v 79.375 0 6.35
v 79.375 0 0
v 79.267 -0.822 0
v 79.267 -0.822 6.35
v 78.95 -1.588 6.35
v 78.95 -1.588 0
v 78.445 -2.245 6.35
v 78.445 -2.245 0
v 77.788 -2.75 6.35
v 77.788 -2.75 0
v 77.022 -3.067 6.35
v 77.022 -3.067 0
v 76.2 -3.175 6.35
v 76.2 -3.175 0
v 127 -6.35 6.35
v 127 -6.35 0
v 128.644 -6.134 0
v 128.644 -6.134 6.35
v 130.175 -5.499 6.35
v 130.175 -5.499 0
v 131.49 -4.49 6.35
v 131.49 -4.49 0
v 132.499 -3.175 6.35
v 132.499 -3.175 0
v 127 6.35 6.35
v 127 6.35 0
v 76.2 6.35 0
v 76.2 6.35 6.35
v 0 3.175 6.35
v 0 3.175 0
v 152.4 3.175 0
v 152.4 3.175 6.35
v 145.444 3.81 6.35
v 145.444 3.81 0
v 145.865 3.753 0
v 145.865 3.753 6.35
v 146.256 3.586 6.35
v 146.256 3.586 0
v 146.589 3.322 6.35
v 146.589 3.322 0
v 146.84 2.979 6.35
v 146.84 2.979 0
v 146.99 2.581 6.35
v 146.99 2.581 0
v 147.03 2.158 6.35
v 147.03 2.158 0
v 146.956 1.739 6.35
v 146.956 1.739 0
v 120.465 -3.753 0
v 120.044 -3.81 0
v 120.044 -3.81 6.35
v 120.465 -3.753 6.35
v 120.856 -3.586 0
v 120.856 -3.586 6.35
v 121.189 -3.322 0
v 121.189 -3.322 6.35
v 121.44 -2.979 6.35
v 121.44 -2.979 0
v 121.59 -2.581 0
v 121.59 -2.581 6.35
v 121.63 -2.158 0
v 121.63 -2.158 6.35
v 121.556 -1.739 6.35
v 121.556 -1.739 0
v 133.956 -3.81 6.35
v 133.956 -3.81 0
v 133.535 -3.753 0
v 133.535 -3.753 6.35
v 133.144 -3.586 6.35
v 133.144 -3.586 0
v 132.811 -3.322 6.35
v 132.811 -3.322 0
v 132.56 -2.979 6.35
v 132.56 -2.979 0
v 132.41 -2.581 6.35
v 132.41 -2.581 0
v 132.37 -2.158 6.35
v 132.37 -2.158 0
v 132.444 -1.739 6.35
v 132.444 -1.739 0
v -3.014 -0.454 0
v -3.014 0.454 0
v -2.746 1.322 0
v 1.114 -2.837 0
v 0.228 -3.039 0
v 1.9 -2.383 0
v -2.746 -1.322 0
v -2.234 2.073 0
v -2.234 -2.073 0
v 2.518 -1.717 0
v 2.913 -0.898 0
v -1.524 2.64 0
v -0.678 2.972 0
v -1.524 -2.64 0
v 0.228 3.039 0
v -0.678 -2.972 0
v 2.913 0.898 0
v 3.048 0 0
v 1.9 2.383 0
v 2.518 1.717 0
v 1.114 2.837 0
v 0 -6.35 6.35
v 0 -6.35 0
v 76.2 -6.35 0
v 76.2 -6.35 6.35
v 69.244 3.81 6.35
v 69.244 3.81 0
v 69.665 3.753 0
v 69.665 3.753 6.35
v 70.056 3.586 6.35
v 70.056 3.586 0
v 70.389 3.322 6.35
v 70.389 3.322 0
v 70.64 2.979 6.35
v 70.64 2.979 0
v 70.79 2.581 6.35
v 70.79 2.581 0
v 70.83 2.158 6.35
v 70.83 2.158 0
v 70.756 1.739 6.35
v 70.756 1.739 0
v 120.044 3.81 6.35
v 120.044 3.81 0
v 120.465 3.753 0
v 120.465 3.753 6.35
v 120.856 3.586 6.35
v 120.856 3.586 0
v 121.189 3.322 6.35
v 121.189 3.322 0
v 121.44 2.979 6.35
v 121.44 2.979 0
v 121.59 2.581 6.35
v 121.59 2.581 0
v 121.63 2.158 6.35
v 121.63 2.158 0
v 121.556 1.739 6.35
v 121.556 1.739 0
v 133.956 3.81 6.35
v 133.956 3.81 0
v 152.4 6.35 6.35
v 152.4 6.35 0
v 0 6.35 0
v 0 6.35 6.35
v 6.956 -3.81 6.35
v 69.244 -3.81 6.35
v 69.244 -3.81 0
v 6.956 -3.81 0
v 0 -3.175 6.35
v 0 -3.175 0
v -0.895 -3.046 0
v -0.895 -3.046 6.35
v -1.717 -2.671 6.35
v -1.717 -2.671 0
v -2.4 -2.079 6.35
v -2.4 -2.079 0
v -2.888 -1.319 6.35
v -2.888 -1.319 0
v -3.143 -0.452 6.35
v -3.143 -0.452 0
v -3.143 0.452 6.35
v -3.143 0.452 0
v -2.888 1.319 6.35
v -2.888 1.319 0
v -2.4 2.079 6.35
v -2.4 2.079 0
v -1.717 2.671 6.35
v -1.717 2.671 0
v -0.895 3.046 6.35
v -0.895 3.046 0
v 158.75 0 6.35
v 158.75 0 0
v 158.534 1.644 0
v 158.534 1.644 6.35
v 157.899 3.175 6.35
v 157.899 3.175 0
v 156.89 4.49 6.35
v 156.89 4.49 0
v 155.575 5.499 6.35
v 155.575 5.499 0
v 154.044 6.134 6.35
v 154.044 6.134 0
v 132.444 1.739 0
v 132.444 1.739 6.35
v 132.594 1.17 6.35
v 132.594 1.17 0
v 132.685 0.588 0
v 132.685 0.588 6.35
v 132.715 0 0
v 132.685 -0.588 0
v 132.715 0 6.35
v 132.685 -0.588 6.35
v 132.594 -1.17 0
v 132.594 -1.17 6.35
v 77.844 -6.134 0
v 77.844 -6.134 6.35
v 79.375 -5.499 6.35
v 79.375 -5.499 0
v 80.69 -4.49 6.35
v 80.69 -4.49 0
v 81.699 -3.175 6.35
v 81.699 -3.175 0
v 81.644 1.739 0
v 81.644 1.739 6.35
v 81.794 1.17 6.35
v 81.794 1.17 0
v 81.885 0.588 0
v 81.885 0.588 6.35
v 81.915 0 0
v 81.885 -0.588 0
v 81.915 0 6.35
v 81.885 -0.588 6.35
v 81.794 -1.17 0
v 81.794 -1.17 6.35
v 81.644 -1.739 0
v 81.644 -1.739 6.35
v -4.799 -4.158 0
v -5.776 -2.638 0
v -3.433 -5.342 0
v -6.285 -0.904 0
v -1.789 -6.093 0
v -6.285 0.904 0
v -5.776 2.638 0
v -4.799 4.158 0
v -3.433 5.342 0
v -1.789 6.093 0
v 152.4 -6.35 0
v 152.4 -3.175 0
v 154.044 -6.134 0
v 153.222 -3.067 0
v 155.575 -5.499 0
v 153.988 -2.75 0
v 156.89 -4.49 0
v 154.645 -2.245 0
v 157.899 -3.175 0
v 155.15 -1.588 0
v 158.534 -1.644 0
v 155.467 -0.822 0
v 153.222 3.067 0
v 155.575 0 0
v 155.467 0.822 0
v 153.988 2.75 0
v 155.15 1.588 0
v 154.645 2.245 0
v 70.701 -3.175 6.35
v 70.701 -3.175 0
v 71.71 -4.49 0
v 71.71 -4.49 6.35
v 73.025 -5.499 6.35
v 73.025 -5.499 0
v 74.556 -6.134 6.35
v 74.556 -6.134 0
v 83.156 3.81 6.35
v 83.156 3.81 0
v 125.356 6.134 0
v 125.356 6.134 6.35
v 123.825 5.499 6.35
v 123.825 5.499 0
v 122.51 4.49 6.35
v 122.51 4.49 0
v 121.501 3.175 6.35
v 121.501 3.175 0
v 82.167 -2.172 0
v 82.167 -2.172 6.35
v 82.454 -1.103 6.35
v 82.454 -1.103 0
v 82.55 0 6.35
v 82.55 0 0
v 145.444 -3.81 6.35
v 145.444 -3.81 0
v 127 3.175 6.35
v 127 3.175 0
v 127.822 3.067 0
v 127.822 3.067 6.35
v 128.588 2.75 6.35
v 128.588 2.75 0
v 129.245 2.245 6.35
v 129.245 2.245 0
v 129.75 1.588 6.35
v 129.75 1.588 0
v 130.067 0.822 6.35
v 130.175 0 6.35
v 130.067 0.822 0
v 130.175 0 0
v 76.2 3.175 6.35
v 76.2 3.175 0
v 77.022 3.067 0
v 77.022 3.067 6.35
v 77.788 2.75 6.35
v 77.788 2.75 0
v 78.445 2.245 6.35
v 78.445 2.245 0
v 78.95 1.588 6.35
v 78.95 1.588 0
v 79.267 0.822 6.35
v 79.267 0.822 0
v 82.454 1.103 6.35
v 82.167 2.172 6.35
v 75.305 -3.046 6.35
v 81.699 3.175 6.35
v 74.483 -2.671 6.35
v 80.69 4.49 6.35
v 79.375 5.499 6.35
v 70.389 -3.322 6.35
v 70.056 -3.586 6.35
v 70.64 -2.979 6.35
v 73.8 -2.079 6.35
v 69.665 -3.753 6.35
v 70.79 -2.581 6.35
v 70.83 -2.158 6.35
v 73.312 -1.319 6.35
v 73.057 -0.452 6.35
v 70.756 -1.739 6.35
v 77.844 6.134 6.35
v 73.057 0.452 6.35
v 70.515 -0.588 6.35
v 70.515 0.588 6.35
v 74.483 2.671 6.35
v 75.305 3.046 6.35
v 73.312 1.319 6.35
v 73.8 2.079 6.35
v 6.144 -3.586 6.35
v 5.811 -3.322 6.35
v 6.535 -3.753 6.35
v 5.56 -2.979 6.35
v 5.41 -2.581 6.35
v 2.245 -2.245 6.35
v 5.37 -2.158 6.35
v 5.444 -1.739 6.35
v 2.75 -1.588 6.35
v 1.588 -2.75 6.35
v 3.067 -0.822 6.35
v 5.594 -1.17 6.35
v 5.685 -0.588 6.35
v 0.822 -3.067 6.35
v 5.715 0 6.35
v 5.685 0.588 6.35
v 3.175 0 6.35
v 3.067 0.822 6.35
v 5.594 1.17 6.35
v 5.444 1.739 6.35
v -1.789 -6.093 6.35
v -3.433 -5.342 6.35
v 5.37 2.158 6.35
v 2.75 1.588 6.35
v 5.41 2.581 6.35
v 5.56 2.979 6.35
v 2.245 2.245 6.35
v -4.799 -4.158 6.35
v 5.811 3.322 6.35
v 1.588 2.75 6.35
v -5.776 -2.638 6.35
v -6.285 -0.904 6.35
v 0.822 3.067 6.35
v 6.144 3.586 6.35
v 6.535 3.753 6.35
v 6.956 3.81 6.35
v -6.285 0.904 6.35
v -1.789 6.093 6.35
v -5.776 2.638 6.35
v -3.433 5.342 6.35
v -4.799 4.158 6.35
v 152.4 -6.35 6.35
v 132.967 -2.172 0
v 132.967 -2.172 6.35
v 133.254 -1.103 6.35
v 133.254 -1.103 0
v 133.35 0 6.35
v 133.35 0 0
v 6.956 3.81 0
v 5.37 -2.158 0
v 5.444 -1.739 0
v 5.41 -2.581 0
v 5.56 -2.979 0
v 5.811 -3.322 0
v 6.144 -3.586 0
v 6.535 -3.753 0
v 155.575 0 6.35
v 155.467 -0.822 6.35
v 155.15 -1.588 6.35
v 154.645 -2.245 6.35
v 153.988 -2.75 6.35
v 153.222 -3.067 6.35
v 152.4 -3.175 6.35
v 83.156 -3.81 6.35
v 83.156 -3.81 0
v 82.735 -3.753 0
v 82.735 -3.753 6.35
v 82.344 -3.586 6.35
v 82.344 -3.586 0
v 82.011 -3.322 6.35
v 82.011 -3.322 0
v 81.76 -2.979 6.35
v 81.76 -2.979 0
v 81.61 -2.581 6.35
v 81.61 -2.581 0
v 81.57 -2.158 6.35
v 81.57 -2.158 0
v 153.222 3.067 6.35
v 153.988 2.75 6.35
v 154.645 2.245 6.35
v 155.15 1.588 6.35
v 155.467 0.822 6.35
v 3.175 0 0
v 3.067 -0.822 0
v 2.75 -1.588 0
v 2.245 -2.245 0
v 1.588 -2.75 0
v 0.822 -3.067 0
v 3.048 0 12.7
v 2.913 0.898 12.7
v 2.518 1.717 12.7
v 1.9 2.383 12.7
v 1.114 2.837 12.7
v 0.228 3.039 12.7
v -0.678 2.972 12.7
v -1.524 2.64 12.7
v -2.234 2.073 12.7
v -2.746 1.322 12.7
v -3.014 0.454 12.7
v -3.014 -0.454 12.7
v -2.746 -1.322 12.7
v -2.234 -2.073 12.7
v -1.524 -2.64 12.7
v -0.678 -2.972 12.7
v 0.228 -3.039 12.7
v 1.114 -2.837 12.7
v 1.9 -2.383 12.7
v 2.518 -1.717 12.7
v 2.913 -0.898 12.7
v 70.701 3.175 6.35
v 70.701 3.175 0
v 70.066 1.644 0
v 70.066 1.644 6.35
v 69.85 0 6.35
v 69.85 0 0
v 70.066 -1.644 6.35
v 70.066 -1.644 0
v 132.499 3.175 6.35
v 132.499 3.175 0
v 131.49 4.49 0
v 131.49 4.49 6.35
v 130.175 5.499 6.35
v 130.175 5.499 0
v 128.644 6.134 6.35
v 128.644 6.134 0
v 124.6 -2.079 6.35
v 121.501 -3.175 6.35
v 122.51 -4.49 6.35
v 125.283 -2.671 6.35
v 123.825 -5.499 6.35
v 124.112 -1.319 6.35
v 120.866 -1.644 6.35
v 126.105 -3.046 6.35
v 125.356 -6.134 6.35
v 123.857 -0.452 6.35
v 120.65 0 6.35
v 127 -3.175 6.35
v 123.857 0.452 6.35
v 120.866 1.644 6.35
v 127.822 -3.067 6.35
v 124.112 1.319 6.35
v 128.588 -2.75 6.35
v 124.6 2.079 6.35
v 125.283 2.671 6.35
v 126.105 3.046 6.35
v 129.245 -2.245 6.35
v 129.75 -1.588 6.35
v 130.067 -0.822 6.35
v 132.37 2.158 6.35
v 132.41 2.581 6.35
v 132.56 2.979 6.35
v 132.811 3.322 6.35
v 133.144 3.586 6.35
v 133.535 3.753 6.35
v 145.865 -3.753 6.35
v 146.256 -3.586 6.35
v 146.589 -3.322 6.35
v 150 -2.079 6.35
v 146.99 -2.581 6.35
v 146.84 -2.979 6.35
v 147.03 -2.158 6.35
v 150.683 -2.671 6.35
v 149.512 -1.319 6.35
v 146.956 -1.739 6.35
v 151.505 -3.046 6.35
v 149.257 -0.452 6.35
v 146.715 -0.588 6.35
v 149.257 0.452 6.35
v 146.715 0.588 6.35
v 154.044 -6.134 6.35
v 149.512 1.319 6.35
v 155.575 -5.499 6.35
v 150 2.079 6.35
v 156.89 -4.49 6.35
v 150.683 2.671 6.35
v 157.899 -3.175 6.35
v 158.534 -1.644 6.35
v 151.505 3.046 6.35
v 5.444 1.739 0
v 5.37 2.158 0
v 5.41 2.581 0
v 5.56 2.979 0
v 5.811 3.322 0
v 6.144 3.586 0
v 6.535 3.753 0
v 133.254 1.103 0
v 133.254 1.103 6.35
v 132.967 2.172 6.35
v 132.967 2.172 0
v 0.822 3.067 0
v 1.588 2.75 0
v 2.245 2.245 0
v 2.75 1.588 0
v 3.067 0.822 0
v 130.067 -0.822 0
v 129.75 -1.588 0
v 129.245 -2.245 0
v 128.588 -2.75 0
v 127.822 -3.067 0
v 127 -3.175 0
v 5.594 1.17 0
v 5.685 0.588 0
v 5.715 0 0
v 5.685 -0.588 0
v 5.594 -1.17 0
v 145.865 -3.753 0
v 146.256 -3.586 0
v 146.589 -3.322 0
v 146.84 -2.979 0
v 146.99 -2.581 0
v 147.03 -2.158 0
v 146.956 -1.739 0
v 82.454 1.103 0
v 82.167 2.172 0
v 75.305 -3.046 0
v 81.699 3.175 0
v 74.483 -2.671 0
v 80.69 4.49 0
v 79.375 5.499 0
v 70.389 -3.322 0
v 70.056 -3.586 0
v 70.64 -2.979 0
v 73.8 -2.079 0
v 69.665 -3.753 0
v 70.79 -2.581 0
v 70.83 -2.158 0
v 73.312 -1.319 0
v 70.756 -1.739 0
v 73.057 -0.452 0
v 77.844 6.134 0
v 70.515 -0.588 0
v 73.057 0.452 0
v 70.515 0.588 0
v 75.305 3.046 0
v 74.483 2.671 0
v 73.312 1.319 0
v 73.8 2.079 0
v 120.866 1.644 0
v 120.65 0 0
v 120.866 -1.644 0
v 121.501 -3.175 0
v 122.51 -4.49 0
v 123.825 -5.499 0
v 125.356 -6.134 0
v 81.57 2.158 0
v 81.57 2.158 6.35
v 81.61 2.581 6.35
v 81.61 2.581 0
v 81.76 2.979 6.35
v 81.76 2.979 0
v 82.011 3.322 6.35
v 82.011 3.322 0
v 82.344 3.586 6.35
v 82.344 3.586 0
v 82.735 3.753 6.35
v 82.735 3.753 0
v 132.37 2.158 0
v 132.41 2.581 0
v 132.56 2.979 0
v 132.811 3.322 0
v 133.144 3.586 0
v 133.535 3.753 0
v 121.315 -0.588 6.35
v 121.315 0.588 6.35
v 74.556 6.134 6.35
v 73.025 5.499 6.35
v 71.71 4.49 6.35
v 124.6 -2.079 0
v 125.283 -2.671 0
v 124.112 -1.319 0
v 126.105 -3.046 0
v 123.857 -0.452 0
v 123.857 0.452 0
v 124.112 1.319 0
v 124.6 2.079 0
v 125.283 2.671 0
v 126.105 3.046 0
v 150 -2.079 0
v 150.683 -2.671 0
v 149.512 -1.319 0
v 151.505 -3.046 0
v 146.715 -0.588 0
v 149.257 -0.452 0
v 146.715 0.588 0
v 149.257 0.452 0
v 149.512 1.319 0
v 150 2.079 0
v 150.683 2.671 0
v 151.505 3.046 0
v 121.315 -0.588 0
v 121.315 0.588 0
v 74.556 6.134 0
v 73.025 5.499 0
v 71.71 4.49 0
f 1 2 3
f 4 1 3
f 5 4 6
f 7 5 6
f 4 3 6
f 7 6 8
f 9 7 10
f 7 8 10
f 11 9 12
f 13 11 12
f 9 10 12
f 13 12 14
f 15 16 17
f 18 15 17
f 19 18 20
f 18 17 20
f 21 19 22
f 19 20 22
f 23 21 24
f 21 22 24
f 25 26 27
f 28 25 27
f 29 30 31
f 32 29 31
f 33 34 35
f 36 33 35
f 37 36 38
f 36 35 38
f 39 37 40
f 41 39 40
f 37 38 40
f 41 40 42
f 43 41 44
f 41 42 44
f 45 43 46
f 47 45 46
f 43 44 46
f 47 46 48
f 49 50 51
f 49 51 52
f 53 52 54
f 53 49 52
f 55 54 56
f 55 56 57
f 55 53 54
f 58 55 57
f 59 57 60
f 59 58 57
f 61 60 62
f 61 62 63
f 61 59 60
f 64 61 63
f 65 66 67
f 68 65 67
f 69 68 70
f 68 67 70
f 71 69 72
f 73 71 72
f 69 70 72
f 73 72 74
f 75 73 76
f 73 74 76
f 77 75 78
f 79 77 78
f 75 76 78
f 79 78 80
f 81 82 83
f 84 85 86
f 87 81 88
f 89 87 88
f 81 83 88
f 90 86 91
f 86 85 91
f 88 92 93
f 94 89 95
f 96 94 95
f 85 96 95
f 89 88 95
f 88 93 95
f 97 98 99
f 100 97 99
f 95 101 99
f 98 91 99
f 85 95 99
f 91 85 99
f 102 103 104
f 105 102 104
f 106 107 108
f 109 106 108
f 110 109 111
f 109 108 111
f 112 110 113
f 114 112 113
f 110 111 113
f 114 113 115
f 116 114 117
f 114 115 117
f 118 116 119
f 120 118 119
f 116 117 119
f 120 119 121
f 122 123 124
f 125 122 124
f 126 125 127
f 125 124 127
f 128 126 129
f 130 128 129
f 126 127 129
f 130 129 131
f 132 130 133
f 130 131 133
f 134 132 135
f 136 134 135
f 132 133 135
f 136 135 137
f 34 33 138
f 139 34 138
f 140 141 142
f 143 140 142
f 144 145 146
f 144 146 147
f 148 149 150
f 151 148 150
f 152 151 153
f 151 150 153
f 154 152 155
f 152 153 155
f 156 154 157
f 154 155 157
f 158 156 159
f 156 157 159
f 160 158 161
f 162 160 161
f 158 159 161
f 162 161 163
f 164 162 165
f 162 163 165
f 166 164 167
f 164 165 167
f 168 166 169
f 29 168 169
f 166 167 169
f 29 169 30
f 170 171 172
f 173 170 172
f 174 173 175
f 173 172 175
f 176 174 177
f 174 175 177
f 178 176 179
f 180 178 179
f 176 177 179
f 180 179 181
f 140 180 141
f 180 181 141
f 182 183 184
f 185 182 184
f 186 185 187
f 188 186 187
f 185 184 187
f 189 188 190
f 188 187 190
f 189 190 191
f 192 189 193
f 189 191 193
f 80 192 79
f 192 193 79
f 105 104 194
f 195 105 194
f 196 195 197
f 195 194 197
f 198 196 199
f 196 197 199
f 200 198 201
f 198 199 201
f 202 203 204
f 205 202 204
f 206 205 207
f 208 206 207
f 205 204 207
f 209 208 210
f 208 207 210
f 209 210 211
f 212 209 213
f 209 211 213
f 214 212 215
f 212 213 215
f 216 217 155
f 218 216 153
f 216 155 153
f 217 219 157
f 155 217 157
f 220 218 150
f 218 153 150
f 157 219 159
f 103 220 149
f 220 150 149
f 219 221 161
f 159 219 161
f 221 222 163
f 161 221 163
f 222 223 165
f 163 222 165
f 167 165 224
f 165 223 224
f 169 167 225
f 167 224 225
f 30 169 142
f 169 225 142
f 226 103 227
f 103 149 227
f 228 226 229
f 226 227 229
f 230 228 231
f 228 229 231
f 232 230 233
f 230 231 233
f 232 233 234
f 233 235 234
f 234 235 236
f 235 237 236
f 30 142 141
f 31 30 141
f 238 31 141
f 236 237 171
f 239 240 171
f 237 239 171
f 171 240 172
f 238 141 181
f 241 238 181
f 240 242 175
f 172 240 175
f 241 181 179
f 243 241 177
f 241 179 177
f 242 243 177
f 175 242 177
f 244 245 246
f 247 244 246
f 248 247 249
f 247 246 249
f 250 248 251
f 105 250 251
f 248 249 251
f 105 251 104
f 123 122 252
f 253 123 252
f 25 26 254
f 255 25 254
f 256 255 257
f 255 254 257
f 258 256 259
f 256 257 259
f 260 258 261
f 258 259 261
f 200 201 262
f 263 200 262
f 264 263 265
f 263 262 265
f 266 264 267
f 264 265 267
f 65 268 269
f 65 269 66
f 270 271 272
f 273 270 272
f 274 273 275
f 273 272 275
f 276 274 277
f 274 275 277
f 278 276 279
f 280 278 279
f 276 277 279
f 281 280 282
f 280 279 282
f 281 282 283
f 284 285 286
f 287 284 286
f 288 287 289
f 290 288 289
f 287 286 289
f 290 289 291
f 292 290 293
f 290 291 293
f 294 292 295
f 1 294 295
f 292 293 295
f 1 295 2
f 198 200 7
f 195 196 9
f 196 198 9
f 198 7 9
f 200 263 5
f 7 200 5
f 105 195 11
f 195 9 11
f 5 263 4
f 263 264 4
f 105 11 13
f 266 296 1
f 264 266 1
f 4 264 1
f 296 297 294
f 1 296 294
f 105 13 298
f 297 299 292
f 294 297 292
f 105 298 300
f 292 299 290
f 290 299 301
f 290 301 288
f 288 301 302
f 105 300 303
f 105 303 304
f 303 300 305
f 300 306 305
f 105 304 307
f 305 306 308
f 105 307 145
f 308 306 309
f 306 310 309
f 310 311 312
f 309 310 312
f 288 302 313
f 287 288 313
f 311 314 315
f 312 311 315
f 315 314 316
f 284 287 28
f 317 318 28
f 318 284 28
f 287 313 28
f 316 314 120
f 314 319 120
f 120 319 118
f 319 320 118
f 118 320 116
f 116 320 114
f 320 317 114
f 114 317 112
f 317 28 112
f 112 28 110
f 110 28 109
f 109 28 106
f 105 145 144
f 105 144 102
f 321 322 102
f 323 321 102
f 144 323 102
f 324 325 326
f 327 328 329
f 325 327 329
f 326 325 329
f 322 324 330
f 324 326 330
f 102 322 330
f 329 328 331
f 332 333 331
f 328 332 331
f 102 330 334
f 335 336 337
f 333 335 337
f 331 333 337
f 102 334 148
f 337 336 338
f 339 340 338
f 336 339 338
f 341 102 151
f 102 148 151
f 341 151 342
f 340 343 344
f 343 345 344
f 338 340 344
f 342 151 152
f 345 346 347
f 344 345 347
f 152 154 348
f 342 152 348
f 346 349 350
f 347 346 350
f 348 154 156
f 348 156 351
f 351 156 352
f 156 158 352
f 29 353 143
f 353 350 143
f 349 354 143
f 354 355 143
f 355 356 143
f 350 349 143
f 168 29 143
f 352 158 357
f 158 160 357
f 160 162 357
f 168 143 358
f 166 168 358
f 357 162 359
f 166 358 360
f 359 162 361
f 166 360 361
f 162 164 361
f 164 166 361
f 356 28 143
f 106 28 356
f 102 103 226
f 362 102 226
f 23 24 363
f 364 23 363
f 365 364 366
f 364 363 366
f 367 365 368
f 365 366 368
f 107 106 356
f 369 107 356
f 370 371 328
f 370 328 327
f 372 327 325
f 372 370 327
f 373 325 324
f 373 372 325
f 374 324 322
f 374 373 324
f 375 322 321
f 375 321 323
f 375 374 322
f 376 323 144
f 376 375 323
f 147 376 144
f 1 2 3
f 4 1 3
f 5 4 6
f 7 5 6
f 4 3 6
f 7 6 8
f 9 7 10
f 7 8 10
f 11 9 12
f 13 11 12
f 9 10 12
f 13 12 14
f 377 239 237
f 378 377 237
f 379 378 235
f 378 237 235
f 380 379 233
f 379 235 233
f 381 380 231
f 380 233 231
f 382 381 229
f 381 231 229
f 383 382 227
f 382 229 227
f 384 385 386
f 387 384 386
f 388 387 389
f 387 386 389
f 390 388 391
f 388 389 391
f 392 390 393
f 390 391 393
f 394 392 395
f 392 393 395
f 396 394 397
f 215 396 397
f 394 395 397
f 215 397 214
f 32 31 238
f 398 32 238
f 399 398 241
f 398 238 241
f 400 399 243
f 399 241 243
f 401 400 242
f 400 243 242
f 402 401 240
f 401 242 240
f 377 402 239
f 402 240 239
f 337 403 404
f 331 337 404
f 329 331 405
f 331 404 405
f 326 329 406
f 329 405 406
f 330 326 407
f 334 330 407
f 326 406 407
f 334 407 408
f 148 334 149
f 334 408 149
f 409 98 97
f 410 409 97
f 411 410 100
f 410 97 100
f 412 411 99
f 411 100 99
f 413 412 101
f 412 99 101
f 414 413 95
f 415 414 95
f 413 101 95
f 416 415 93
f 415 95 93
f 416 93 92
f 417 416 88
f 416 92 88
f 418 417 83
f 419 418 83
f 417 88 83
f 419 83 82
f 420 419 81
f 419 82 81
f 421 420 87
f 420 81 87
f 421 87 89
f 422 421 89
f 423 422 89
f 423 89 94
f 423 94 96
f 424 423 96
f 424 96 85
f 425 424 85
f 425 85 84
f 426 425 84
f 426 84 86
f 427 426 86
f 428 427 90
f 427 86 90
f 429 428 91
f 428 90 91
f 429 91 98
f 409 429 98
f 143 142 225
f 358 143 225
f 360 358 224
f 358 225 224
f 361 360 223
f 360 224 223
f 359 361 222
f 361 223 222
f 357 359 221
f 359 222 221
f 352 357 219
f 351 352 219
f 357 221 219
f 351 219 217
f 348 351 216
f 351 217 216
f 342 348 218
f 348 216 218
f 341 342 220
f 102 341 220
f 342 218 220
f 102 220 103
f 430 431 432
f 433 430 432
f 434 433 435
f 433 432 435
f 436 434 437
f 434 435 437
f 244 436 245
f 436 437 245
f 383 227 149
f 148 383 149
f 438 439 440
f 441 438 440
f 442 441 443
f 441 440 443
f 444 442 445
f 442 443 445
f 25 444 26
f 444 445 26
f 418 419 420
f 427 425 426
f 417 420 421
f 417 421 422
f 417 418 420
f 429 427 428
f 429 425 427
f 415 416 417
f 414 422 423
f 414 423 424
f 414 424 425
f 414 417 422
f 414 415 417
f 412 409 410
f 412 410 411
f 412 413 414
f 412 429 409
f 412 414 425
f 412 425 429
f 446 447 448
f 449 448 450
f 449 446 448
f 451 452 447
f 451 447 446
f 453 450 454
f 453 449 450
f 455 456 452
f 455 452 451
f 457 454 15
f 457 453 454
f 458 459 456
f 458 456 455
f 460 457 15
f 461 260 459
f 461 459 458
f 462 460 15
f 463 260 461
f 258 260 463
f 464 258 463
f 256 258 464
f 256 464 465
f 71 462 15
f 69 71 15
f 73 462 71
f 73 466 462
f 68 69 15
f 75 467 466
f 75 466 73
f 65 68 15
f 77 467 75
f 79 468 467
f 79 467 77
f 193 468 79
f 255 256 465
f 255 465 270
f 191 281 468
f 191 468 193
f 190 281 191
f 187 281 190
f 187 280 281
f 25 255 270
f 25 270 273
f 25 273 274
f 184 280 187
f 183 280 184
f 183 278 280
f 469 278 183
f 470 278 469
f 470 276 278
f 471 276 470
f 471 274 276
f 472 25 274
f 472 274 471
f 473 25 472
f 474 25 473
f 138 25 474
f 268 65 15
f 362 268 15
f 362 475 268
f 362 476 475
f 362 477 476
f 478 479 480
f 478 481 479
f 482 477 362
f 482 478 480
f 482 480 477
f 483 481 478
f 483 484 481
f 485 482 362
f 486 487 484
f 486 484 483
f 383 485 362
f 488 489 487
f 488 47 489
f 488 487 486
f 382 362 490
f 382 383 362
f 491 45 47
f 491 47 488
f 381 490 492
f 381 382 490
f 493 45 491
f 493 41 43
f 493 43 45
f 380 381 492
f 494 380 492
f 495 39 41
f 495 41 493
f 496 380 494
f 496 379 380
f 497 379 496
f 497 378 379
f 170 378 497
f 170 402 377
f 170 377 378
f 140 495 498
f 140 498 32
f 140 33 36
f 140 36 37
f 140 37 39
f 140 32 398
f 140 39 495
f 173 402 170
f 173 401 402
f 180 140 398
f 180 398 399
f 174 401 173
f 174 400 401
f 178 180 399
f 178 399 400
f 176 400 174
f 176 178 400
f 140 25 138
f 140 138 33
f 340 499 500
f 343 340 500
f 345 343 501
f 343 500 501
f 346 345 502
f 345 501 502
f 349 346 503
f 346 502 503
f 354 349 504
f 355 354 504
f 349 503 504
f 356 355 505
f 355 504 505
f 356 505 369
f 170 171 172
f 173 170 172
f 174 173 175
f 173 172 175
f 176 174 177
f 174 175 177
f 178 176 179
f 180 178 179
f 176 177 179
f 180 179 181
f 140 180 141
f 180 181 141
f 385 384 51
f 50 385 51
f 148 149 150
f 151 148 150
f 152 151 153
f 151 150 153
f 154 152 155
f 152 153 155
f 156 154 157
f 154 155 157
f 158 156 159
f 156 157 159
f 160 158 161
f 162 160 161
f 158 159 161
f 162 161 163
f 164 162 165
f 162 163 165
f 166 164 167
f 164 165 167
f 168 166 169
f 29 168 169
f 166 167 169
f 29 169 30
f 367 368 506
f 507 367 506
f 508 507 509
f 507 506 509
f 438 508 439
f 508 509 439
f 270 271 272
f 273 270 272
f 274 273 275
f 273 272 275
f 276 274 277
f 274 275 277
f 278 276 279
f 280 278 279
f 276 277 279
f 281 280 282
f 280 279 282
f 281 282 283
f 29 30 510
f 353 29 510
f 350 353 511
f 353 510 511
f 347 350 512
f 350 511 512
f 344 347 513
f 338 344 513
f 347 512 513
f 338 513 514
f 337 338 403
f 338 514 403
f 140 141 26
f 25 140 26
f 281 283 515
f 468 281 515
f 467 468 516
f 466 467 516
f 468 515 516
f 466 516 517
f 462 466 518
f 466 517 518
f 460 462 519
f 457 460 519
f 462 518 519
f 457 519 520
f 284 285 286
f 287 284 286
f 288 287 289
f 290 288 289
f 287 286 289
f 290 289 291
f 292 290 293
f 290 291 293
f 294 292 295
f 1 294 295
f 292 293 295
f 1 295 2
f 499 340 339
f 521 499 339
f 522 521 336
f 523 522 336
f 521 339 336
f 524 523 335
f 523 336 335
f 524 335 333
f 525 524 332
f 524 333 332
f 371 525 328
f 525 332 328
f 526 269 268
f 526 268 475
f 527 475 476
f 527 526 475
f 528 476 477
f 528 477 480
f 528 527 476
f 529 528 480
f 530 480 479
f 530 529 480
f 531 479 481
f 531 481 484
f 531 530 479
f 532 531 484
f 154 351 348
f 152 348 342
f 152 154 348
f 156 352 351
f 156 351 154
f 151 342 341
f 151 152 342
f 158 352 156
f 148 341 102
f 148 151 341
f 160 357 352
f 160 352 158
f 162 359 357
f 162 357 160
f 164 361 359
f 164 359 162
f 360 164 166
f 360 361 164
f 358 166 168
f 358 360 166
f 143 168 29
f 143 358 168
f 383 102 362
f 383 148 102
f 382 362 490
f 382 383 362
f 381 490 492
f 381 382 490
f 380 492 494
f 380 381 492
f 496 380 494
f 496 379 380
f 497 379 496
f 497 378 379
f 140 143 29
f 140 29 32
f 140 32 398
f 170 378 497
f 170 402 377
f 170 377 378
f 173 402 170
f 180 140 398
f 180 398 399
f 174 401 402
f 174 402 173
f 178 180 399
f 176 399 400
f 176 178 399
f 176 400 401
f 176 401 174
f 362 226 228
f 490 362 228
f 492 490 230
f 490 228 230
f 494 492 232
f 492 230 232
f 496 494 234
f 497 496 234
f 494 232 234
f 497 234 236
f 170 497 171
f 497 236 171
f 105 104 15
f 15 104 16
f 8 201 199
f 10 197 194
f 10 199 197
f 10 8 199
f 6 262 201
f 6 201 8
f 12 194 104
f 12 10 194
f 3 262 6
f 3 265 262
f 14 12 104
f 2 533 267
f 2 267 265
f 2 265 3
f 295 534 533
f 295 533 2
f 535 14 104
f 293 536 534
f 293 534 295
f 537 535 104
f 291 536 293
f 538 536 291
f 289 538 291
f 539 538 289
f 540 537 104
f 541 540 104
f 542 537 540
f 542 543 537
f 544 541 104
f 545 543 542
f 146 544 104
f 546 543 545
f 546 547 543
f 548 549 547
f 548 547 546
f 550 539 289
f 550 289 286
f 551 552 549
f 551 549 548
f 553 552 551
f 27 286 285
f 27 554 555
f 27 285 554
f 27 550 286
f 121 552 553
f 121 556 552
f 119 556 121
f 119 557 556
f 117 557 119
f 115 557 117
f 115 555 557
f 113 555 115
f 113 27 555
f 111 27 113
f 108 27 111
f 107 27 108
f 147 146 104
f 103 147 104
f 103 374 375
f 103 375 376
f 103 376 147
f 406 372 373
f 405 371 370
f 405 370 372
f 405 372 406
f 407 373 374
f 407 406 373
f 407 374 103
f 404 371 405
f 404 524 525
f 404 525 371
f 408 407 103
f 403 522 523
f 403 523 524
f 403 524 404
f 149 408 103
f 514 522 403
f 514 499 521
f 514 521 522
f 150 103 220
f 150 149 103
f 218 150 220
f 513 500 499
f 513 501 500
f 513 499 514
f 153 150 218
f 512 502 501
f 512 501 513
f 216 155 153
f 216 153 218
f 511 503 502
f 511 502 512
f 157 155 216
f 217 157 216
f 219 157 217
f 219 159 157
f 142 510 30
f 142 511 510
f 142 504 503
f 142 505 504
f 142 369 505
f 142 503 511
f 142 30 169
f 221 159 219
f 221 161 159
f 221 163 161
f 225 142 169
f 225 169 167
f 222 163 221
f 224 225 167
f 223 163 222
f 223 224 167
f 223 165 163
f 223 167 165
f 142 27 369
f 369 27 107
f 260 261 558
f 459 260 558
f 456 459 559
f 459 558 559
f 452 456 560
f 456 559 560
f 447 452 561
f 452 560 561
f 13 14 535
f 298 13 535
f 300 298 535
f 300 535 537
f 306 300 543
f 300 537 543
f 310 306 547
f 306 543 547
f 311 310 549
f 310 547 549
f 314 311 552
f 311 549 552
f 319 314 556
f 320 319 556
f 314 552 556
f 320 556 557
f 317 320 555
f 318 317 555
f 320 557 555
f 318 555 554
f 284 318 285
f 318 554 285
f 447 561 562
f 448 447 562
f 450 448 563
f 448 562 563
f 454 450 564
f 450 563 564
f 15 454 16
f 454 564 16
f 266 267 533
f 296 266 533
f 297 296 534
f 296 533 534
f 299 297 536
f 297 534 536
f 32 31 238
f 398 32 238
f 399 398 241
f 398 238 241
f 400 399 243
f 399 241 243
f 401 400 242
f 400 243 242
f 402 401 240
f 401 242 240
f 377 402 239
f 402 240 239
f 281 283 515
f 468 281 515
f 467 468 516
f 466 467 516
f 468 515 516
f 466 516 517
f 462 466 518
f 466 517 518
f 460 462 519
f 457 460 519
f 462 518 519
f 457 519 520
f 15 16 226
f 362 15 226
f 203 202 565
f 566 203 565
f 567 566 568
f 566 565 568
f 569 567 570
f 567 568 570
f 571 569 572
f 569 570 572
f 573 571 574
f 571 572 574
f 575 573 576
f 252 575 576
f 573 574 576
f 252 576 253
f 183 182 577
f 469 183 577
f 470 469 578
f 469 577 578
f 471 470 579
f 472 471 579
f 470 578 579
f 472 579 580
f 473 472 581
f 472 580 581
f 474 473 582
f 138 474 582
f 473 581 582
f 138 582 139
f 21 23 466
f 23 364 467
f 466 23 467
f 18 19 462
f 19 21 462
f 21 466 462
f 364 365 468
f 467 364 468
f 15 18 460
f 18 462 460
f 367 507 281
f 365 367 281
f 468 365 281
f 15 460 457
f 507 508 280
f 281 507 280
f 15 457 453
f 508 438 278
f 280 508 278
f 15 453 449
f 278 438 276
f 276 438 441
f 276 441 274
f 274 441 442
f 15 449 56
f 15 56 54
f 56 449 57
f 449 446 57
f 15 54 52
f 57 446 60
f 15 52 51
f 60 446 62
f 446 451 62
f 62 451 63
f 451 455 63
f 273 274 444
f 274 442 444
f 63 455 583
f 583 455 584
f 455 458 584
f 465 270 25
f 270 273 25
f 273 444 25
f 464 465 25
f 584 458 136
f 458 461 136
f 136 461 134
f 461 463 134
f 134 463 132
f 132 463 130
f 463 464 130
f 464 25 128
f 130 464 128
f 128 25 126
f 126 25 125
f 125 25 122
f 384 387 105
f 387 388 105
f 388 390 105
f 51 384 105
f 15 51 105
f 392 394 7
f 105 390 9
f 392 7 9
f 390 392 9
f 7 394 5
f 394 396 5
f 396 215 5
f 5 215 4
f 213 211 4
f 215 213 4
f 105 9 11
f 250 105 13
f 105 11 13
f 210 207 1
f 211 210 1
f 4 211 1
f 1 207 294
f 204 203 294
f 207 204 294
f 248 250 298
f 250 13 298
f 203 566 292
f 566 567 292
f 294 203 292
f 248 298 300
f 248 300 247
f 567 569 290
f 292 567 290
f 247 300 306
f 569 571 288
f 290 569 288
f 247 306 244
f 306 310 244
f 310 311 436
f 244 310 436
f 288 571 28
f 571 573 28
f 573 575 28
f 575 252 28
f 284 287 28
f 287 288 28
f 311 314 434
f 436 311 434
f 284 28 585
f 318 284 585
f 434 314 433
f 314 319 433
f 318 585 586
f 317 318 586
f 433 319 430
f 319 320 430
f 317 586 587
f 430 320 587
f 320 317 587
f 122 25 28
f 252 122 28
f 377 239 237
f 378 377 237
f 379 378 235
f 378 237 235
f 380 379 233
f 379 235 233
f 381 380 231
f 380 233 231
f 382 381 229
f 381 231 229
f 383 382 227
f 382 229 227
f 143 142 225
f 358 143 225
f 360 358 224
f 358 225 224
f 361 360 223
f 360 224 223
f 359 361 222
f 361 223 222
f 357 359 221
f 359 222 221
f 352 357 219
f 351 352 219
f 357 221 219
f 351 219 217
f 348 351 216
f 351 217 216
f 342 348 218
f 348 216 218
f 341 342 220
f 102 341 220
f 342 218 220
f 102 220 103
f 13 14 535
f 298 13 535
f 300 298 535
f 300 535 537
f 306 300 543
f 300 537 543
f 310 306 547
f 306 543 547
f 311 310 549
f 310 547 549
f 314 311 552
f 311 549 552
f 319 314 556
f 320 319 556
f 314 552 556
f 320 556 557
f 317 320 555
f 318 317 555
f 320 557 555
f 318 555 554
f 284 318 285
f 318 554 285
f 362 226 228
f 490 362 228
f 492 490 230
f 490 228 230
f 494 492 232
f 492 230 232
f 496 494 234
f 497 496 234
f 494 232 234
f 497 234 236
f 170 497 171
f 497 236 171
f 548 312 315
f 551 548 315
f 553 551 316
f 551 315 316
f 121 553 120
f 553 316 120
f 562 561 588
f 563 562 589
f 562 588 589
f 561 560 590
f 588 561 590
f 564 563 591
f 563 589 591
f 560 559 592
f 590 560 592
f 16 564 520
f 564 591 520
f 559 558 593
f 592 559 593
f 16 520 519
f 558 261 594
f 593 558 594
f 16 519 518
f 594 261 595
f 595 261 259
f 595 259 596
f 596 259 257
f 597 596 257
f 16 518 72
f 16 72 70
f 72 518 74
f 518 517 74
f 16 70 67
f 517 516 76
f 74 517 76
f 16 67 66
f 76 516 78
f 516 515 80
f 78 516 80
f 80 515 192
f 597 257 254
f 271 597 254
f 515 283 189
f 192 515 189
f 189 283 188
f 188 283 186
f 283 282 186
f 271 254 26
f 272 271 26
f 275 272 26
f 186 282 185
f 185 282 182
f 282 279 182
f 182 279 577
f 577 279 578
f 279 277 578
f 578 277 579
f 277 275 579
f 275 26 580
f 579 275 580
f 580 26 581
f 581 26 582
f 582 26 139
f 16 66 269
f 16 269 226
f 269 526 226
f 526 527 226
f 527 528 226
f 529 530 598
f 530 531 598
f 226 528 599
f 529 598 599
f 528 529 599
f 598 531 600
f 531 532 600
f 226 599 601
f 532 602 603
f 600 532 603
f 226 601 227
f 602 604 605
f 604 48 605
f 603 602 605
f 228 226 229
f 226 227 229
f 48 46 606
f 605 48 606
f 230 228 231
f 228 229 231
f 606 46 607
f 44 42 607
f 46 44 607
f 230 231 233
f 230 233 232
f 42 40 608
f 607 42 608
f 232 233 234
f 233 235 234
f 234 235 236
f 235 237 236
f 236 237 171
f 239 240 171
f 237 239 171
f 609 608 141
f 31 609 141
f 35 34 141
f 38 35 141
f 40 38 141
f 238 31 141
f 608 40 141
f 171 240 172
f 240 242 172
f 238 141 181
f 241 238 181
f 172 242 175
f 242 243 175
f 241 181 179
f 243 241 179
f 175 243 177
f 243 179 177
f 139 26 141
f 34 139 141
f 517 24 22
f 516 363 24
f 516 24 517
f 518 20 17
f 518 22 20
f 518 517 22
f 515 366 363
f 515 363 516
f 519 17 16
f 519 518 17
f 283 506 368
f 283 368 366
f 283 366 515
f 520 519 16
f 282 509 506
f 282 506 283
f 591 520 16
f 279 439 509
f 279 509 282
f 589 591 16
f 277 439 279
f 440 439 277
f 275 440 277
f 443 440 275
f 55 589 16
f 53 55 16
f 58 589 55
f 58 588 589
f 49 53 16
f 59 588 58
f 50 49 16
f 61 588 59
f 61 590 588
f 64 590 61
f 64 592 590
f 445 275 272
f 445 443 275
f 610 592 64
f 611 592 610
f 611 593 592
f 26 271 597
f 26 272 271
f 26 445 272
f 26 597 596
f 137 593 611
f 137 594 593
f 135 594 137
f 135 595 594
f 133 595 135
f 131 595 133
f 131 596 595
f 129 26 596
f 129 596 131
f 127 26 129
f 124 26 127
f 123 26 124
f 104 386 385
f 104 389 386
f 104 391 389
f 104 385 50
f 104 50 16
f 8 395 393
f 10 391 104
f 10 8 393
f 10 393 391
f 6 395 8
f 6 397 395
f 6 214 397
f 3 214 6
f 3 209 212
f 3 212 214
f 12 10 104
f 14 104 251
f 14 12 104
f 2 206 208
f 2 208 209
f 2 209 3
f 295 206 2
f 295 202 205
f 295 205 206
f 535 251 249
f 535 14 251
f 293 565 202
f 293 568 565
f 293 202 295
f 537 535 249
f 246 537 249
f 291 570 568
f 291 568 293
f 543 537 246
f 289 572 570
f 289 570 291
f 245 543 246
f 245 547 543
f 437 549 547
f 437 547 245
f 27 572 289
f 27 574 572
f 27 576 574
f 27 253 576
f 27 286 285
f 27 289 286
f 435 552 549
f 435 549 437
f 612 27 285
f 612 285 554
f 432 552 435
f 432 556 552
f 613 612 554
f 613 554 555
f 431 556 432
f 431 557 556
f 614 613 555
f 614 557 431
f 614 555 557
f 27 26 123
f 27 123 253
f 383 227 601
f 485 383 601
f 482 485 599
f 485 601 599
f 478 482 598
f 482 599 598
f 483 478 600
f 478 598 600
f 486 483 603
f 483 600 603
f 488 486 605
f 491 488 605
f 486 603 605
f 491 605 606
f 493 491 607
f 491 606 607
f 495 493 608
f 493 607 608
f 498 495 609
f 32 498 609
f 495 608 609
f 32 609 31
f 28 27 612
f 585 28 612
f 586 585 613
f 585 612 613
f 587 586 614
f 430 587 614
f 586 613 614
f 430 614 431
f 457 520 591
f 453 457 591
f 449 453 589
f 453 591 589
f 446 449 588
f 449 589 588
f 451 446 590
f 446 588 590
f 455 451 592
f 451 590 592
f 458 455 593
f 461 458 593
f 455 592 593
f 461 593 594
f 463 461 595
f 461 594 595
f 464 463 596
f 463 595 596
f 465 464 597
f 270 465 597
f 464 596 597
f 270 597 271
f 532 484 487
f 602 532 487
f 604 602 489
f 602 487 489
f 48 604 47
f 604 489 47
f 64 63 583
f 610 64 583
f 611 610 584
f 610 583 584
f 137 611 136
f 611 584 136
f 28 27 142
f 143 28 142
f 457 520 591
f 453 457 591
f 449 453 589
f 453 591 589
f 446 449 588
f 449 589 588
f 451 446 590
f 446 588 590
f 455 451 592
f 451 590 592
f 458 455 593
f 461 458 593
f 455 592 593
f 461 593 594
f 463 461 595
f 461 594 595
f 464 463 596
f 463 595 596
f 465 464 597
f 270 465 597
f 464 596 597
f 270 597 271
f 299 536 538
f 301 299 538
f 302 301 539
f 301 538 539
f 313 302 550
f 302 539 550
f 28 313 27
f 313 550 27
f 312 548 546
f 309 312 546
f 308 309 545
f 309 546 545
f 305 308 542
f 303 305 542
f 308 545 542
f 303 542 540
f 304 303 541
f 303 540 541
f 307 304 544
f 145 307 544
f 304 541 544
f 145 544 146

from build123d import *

# Parameters (mm, degrees)
F1_DEPTH      = 6.35
F2_DEPTH      = 6.35
F3_DEPTH      = 6.35
F4_DEPTH      = 6.35
F0_R          = 3.048
F5_DEPTH      = 12.7
F6_T          = -2.54
F7_T          = -2.54
F8_T          = -2.54
F9_T1_DEPTH   = 6.35
F9_2_T1_DEPTH = 6.35
F9_3_T1_DEPTH = 6.35


# Not quite as in the source:
# - a fillet or chamfer that OpenCascade refuses, or shapes differently, is made with other operations: its cross-section is extruded or revolved along the edge and cut away or added
# - two fillets or chamfers of one size are made in one step


with BuildPart() as f1:
    # F0 (on Top) → F1 (new body)
    with BuildSketch(Plane.XY):
        with BuildLine():
            ThreePointArc((0, 6.35), (3.175, 5.499261314), (5.499261314, 3.175))
            Line((5.499261314, 3.175), (70.700738686, 3.175))
            ThreePointArc((70.700738686, 3.175), (73.025, 5.499261314), (76.2, 6.35))
            Line((76.2, 6.35), (0, 6.35))
        make_face()
        with BuildLine():
            Line((76.2, 3.175), (70.700738686, 3.175))
            ThreePointArc((70.700738686, 3.175), (69.85, 0), (70.700738686, -3.175))
            Line((70.700738686, -3.175), (76.2, -3.175))
            ThreePointArc((76.2, -3.175), (73.025, 0), (76.2, 3.175))
        make_face()
        with BuildLine():
            Line((81.699261314, 3.175), (76.2, 3.175))
            ThreePointArc((76.2, 3.175), (78.4450640303, 2.2450640303), (79.375, 0))
            ThreePointArc((79.375, 0), (78.4450640303, -2.2450640303), (76.2, -3.175))
            Line((76.2, -3.175), (81.699261314, -3.175))
            ThreePointArc((81.699261314, -3.175), (82.3336289969, -1.6435009364), (82.55, 0))
            ThreePointArc((82.55, 0), (82.3336289969, 1.6435009364), (81.699261314, 3.175))
        make_face()
        with BuildLine():
            ThreePointArc((0, -3.175), (-3.175, 0), (0, 3.175))
            Line((0, 3.175), (5.499261314, 3.175))
            ThreePointArc((5.499261314, 3.175), (3.175, 5.499261314), (0, 6.35))
            ThreePointArc((0, 6.35), (-6.35, 0), (0, -6.35))
            ThreePointArc((0, -6.35), (3.175, -5.499261314), (5.499261314, -3.175))
            Line((5.499261314, -3.175), (0, -3.175))
        make_face()
        with BuildLine():
            ThreePointArc((0, 3.175), (2.2450640303, 2.2450640303), (3.175, 0))
            ThreePointArc((3.175, 0), (2.2450640303, -2.2450640303), (0, -3.175))
            Line((0, -3.175), (5.499261314, -3.175))
            ThreePointArc((5.499261314, -3.175), (6.1336289969, -1.6435009364), (6.35, 0))
            ThreePointArc((6.35, 0), (6.1336289969, 1.6435009364), (5.499261314, 3.175))
            Line((5.499261314, 3.175), (0, 3.175))
        make_face()
        with BuildLine():
            Line((70.700738686, 3.175), (5.499261314, 3.175))
            ThreePointArc((5.499261314, 3.175), (6.1336289969, 1.6435009364), (6.35, 0))
            ThreePointArc((6.35, 0), (6.1336289969, -1.6435009364), (5.499261314, -3.175))
            Line((5.499261314, -3.175), (70.700738686, -3.175))
            ThreePointArc((70.700738686, -3.175), (69.85, 0), (70.700738686, 3.175))
        make_face()
        with BuildLine():
            Line((70.700738686, -3.175), (5.499261314, -3.175))
            ThreePointArc((5.499261314, -3.175), (3.175, -5.499261314), (0, -6.35))
            Line((0, -6.35), (76.2, -6.35))
            ThreePointArc((76.2, -6.35), (73.025, -5.499261314), (70.700738686, -3.175))
        make_face()
        with BuildLine():
            ThreePointArc((76.2, 6.35), (73.025, 5.499261314), (70.700738686, 3.175))
            Line((70.700738686, 3.175), (76.2, 3.175))
            Line((76.2, 3.175), (81.699261314, 3.175))
            ThreePointArc((81.699261314, 3.175), (79.375, 5.499261314), (76.2, 6.35))
        make_face()
        with BuildLine():
            Line((76.2, -3.175), (70.700738686, -3.175))
            ThreePointArc((70.700738686, -3.175), (73.025, -5.499261314), (76.2, -6.35))
            ThreePointArc((76.2, -6.35), (79.375, -5.499261314), (81.699261314, -3.175))
            Line((81.699261314, -3.175), (76.2, -3.175))
        make_face()
    extrude(amount=F1_DEPTH)

    # F6: a shell. OpenCascade refuses it in one call, so the cavity is built on its own and cut out:
    # the body offset inwards by the wall thickness, plus a prism from it out through each open face.
    f6_core = offset(f1.part, amount=F6_T, mode=Mode.PRIVATE)
    f6_exits = [f6_core.faces().sort_by_distance(p)[0] for p in [
        (38.1, 0, 3.81),
        (38.1, 0, 2.54),
    ]]
    add(f6_core, mode=Mode.SUBTRACT)
    extrude(f6_exits, amount=-F6_T, mode=Mode.SUBTRACT)

    # F9: fillet of radius 1.5875 on 4 edges, made by hand

    # F9_s2 → F9_t1 (join)
    with BuildSketch(Plane.XY):
        with BuildLine():
            ThreePointArc((5.4438859411, -1.7393478261), (5.674054576, -3.1587564216), (6.9560764803, -3.81))
            Line((6.9560764803, -3.81), (4.2597094971, -3.81))
            ThreePointArc((4.2597094971, -3.81), (4.961032273, -2.8371435964), (5.4438859411, -1.7393478261))
        make_face()
        with BuildLine():
            ThreePointArc((5.4438859411, 1.7393478261), (5.674054576, 3.1587564216), (6.9560764803, 3.81))
            Line((6.9560764803, 3.81), (4.2597094971, 3.81))
            ThreePointArc((4.2597094971, 3.81), (4.961032273, 2.8371435964), (5.4438859411, 1.7393478261))
        make_face()
        with BuildLine():
            ThreePointArc((69.2439235197, 3.81), (70.525945424, 3.1587564216), (70.7561140589, 1.7393478261))
            ThreePointArc((70.7561140589, 1.7393478261), (71.238967727, 2.8371435964), (71.9402905029, 3.81))
            Line((71.9402905029, 3.81), (69.2439235197, 3.81))
        make_face()
        with BuildLine():
            ThreePointArc((70.7561140589, -1.7393478261), (70.525945424, -3.1587564216), (69.2439235197, -3.81))
            Line((69.2439235197, -3.81), (71.9402905029, -3.81))
            ThreePointArc((71.9402905029, -3.81), (71.238967727, -2.8371435964), (70.7561140589, -1.7393478261))
        make_face()
    extrude(amount=F9_T1_DEPTH)


with BuildPart() as f2:
    # F0 (on Top) → F2 (new body)
    with BuildSketch(Plane.XY):
        with BuildLine():
            Line((127, 6.35), (76.2, 6.35))
            ThreePointArc((76.2, 6.35), (79.375, 5.499261314), (81.699261314, 3.175))
            Line((81.699261314, 3.175), (121.500738686, 3.175))
            ThreePointArc((121.500738686, 3.175), (123.825, 5.499261314), (127, 6.35))
        make_face()
        with BuildLine():
            Line((121.500738686, 3.175), (81.699261314, 3.175))
            ThreePointArc((81.699261314, 3.175), (82.3336289969, 1.6435009364), (82.55, 0))
            ThreePointArc((82.55, 0), (82.3336289969, -1.6435009364), (81.699261314, -3.175))
            Line((81.699261314, -3.175), (121.500738686, -3.175))
            ThreePointArc((121.500738686, -3.175), (120.65, 0), (121.500738686, 3.175))
        make_face()
        with BuildLine():
            ThreePointArc((81.699261314, -3.175), (79.375, -5.499261314), (76.2, -6.35))
            Line((76.2, -6.35), (127, -6.35))
            ThreePointArc((127, -6.35), (123.825, -5.499261314), (121.500738686, -3.175))
            Line((121.500738686, -3.175), (81.699261314, -3.175))
        make_face()
        with BuildLine():
            Line((127, 3.175), (121.500738686, 3.175))
            ThreePointArc((121.500738686, 3.175), (120.65, 0), (121.500738686, -3.175))
            Line((121.500738686, -3.175), (127, -3.175))
            ThreePointArc((127, -3.175), (123.825, 0), (127, 3.175))
        make_face()
        with BuildLine():
            ThreePointArc((132.499261314, 3.175), (130.175, 5.499261314), (127, 6.35))
            ThreePointArc((127, 6.35), (123.825, 5.499261314), (121.500738686, 3.175))
            Line((121.500738686, 3.175), (127, 3.175))
            Line((127, 3.175), (132.499261314, 3.175))
        make_face()
        with BuildLine():
            ThreePointArc((133.35, 0), (133.1336289969, 1.6435009364), (132.499261314, 3.175))
            Line((132.499261314, 3.175), (127, 3.175))
            ThreePointArc((127, 3.175), (129.2450640303, 2.2450640303), (130.175, 0))
            ThreePointArc((130.175, 0), (129.2450640303, -2.2450640303), (127, -3.175))
            Line((127, -3.175), (132.499261314, -3.175))
            ThreePointArc((132.499261314, -3.175), (133.1336289969, -1.6435009364), (133.35, 0))
        make_face()
        with BuildLine():
            ThreePointArc((121.500738686, -3.175), (123.825, -5.499261314), (127, -6.35))
            ThreePointArc((127, -6.35), (130.175, -5.499261314), (132.499261314, -3.175))
            Line((132.499261314, -3.175), (127, -3.175))
            Line((127, -3.175), (121.500738686, -3.175))
        make_face()
        with BuildLine():
            ThreePointArc((76.2, 6.35), (73.025, 5.499261314), (70.700738686, 3.175))
            Line((70.700738686, 3.175), (76.2, 3.175))
            Line((76.2, 3.175), (81.699261314, 3.175))
            ThreePointArc((81.699261314, 3.175), (79.375, 5.499261314), (76.2, 6.35))
        make_face()
        with BuildLine():
            Line((76.2, 3.175), (70.700738686, 3.175))
            ThreePointArc((70.700738686, 3.175), (69.85, 0), (70.700738686, -3.175))
            Line((70.700738686, -3.175), (76.2, -3.175))
            ThreePointArc((76.2, -3.175), (73.025, 0), (76.2, 3.175))
        make_face()
        with BuildLine():
            Line((81.699261314, 3.175), (76.2, 3.175))
            ThreePointArc((76.2, 3.175), (78.4450640303, 2.2450640303), (79.375, 0))
            ThreePointArc((79.375, 0), (78.4450640303, -2.2450640303), (76.2, -3.175))
            Line((76.2, -3.175), (81.699261314, -3.175))
            ThreePointArc((81.699261314, -3.175), (82.3336289969, -1.6435009364), (82.55, 0))
            ThreePointArc((82.55, 0), (82.3336289969, 1.6435009364), (81.699261314, 3.175))
        make_face()
        with BuildLine():
            Line((76.2, -3.175), (70.700738686, -3.175))
            ThreePointArc((70.700738686, -3.175), (73.025, -5.499261314), (76.2, -6.35))
            ThreePointArc((76.2, -6.35), (79.375, -5.499261314), (81.699261314, -3.175))
            Line((81.699261314, -3.175), (76.2, -3.175))
        make_face()
    extrude(amount=F2_DEPTH)

    # F7: a shell. OpenCascade refuses it in one call, so the cavity is built on its own and cut out:
    # the body offset inwards by the wall thickness, plus a prism from it out through each open face.
    f7_core = offset(f2.part, amount=F7_T, mode=Mode.PRIVATE)
    f7_exits = [f7_core.faces().sort_by_distance(p)[0] for p in [
        (101.6, 0, 3.81),
        (101.6, 0, 2.54),
    ]]
    add(f7_core, mode=Mode.SUBTRACT)
    extrude(f7_exits, amount=-F7_T, mode=Mode.SUBTRACT)

    # F9#2: fillet of radius 1.5875 on 4 edges, made by hand

    # F9_2_s2 → F9_2_t1 (join)
    with BuildSketch(Plane.XY):
        with BuildLine():
            ThreePointArc((120.0439235197, -3.81), (121.325945424, -3.1587564216), (121.5561140589, -1.7393478261))
            ThreePointArc((121.5561140589, -1.7393478261), (122.038967727, -2.8371435964), (122.7402905029, -3.81))
            Line((122.7402905029, -3.81), (120.0439235197, -3.81))
        make_face()
        with BuildLine():
            ThreePointArc((83.1560764803, -3.81), (81.874054576, -3.1587564216), (81.6438859411, -1.7393478261))
            ThreePointArc((81.6438859411, -1.7393478261), (81.161032273, -2.8371435964), (80.4597094971, -3.81))
            Line((80.4597094971, -3.81), (83.1560764803, -3.81))
        make_face()
        with BuildLine():
            ThreePointArc((81.6438859411, 1.7393478261), (81.874054576, 3.1587564216), (83.1560764803, 3.81))
            Line((83.1560764803, 3.81), (80.4597094971, 3.81))
            ThreePointArc((80.4597094971, 3.81), (81.161032273, 2.8371435964), (81.6438859411, 1.7393478261))
        make_face()
        with BuildLine():
            ThreePointArc((120.0439235197, 3.81), (121.325945424, 3.1587564216), (121.5561140589, 1.7393478261))
            ThreePointArc((121.5561140589, 1.7393478261), (122.038967727, 2.8371435964), (122.7402905029, 3.81))
            Line((122.7402905029, 3.81), (120.0439235197, 3.81))
        make_face()
    extrude(amount=F9_2_T1_DEPTH)


with BuildPart() as f3:
    # F0 (on Top) → F3 (new body)
    with BuildSketch(Plane.XY):
        with BuildLine():
            Line((152.4, 6.35), (127, 6.35))
            ThreePointArc((127, 6.35), (130.175, 5.499261314), (132.499261314, 3.175))
            Line((132.499261314, 3.175), (146.900738686, 3.175))
            ThreePointArc((146.900738686, 3.175), (149.225, 5.499261314), (152.4, 6.35))
        make_face()
        with BuildLine():
            Line((127, 3.175), (121.500738686, 3.175))
            ThreePointArc((121.500738686, 3.175), (120.65, 0), (121.500738686, -3.175))
            Line((121.500738686, -3.175), (127, -3.175))
            ThreePointArc((127, -3.175), (123.825, 0), (127, 3.175))
        make_face()
        with BuildLine():
            ThreePointArc((133.35, 0), (133.1336289969, 1.6435009364), (132.499261314, 3.175))
            Line((132.499261314, 3.175), (127, 3.175))
            ThreePointArc((127, 3.175), (129.2450640303, 2.2450640303), (130.175, 0))
            ThreePointArc((130.175, 0), (129.2450640303, -2.2450640303), (127, -3.175))
            Line((127, -3.175), (132.499261314, -3.175))
            ThreePointArc((132.499261314, -3.175), (133.1336289969, -1.6435009364), (133.35, 0))
        make_face()
        with BuildLine():
            Line((152.4, 3.175), (146.900738686, 3.175))
            ThreePointArc((146.900738686, 3.175), (146.05, 0), (146.900738686, -3.175))
            Line((146.900738686, -3.175), (152.4, -3.175))
            ThreePointArc((152.4, -3.175), (149.225, 0), (152.4, 3.175))
        make_face()
        with BuildLine():
            ThreePointArc((158.75, 0), (156.8901280605, 4.4901280605), (152.4, 6.35))
            ThreePointArc((152.4, 6.35), (149.225, 5.499261314), (146.900738686, 3.175))
            Line((146.900738686, 3.175), (152.4, 3.175))
            ThreePointArc((152.4, 3.175), (154.6450640303, 2.2450640303), (155.575, 0))
            ThreePointArc((155.575, 0), (154.6450640303, -2.2450640303), (152.4, -3.175))
            Line((152.4, -3.175), (146.900738686, -3.175))
            ThreePointArc((146.900738686, -3.175), (149.225, -5.499261314), (152.4, -6.35))
            ThreePointArc((152.4, -6.35), (156.8901280605, -4.4901280605), (158.75, 0))
        make_face()
        with BuildLine():
            Line((146.900738686, 3.175), (132.499261314, 3.175))
            ThreePointArc((132.499261314, 3.175), (133.1336289969, 1.6435009364), (133.35, 0))
            ThreePointArc((133.35, 0), (133.1336289969, -1.6435009364), (132.499261314, -3.175))
            Line((132.499261314, -3.175), (146.900738686, -3.175))
            ThreePointArc((146.900738686, -3.175), (146.05, 0), (146.900738686, 3.175))
        make_face()
        with BuildLine():
            ThreePointArc((132.499261314, -3.175), (130.175, -5.499261314), (127, -6.35))
            Line((127, -6.35), (152.4, -6.35))
            ThreePointArc((152.4, -6.35), (149.225, -5.499261314), (146.900738686, -3.175))
            Line((146.900738686, -3.175), (132.499261314, -3.175))
        make_face()
        with BuildLine():
            ThreePointArc((132.499261314, 3.175), (130.175, 5.499261314), (127, 6.35))
            ThreePointArc((127, 6.35), (123.825, 5.499261314), (121.500738686, 3.175))
            Line((121.500738686, 3.175), (127, 3.175))
            Line((127, 3.175), (132.499261314, 3.175))
        make_face()
        with BuildLine():
            ThreePointArc((121.500738686, -3.175), (123.825, -5.499261314), (127, -6.35))
            ThreePointArc((127, -6.35), (130.175, -5.499261314), (132.499261314, -3.175))
            Line((132.499261314, -3.175), (127, -3.175))
            Line((127, -3.175), (121.500738686, -3.175))
        make_face()
    extrude(amount=F3_DEPTH)

    # F8: a shell. OpenCascade refuses it in one call, so the cavity is built on its own and cut out:
    # the body offset inwards by the wall thickness, plus a prism from it out through each open face.
    f8_core = offset(f3.part, amount=F8_T, mode=Mode.PRIVATE)
    f8_exits = [f8_core.faces().sort_by_distance(p)[0] for p in [
        (139.7, 0, 3.81),
        (139.7, 0, 2.54),
    ]]
    add(f8_core, mode=Mode.SUBTRACT)
    extrude(f8_exits, amount=-F8_T, mode=Mode.SUBTRACT)

    # F9#3: fillet of radius 1.5875 on 4 edges, made by hand

    # F9_3_s2 → F9_3_t1 (join)
    with BuildSketch(Plane.XY):
        with BuildLine():
            ThreePointArc((133.9560764803, -3.81), (132.674054576, -3.1587564216), (132.4438859411, -1.7393478261))
            ThreePointArc((132.4438859411, -1.7393478261), (131.961032273, -2.8371435964), (131.2597094971, -3.81))
            Line((131.2597094971, -3.81), (133.9560764803, -3.81))
        make_face()
        with BuildLine():
            ThreePointArc((145.4439235197, -3.81), (146.725945424, -3.1587564216), (146.9561140589, -1.7393478261))
            ThreePointArc((146.9561140589, -1.7393478261), (147.438967727, -2.8371435964), (148.1402905029, -3.81))
            Line((148.1402905029, -3.81), (145.4439235197, -3.81))
        make_face()
        with BuildLine():
            ThreePointArc((132.4438859411, 1.7393478261), (132.674054576, 3.1587564216), (133.9560764803, 3.81))
            Line((133.9560764803, 3.81), (131.2597094971, 3.81))
            ThreePointArc((131.2597094971, 3.81), (131.961032273, 2.8371435964), (132.4438859411, 1.7393478261))
        make_face()
        with BuildLine():
            ThreePointArc((145.4439235197, 3.81), (146.725945424, 3.1587564216), (146.9561140589, 1.7393478261))
            ThreePointArc((146.9561140589, 1.7393478261), (147.438967727, 2.8371435964), (148.1402905029, 3.81))
            Line((148.1402905029, 3.81), (145.4439235197, 3.81))
        make_face()
    extrude(amount=F9_3_T1_DEPTH)


with BuildPart() as f4:
    # F0 (on Top) → F4 (new body)
    with BuildSketch(Plane.XY):
        with BuildLine():
            ThreePointArc((0, -3.175), (-3.175, 0), (0, 3.175))
            Line((0, 3.175), (5.499261314, 3.175))
            ThreePointArc((5.499261314, 3.175), (3.175, 5.499261314), (0, 6.35))
            ThreePointArc((0, 6.35), (-6.35, 0), (0, -6.35))
            ThreePointArc((0, -6.35), (3.175, -5.499261314), (5.499261314, -3.175))
            Line((5.499261314, -3.175), (0, -3.175))
        make_face()
        with BuildLine():
            ThreePointArc((0, 6.35), (3.175, 5.499261314), (5.499261314, 3.175))
            Line((5.499261314, 3.175), (70.700738686, 3.175))
            ThreePointArc((70.700738686, 3.175), (73.025, 5.499261314), (76.2, 6.35))
            Line((76.2, 6.35), (0, 6.35))
        make_face()
        with BuildLine():
            ThreePointArc((76.2, 6.35), (73.025, 5.499261314), (70.700738686, 3.175))
            Line((70.700738686, 3.175), (76.2, 3.175))
            Line((76.2, 3.175), (81.699261314, 3.175))
            ThreePointArc((81.699261314, 3.175), (79.375, 5.499261314), (76.2, 6.35))
        make_face()
        with BuildLine():
            Line((70.700738686, -3.175), (5.499261314, -3.175))
            ThreePointArc((5.499261314, -3.175), (3.175, -5.499261314), (0, -6.35))
            Line((0, -6.35), (76.2, -6.35))
            ThreePointArc((76.2, -6.35), (73.025, -5.499261314), (70.700738686, -3.175))
        make_face()
        with BuildLine():
            Line((76.2, -3.175), (70.700738686, -3.175))
            ThreePointArc((70.700738686, -3.175), (73.025, -5.499261314), (76.2, -6.35))
            ThreePointArc((76.2, -6.35), (79.375, -5.499261314), (81.699261314, -3.175))
            Line((81.699261314, -3.175), (76.2, -3.175))
        make_face()
        with BuildLine():
            Line((127, 6.35), (76.2, 6.35))
            ThreePointArc((76.2, 6.35), (79.375, 5.499261314), (81.699261314, 3.175))
            Line((81.699261314, 3.175), (121.500738686, 3.175))
            ThreePointArc((121.500738686, 3.175), (123.825, 5.499261314), (127, 6.35))
        make_face()
        with BuildLine():
            ThreePointArc((132.499261314, 3.175), (130.175, 5.499261314), (127, 6.35))
            ThreePointArc((127, 6.35), (123.825, 5.499261314), (121.500738686, 3.175))
            Line((121.500738686, 3.175), (127, 3.175))
            Line((127, 3.175), (132.499261314, 3.175))
        make_face()
        with BuildLine():
            Line((152.4, 6.35), (127, 6.35))
            ThreePointArc((127, 6.35), (130.175, 5.499261314), (132.499261314, 3.175))
            Line((132.499261314, 3.175), (146.900738686, 3.175))
            ThreePointArc((146.900738686, 3.175), (149.225, 5.499261314), (152.4, 6.35))
        make_face()
        with BuildLine():
            ThreePointArc((158.75, 0), (156.8901280605, 4.4901280605), (152.4, 6.35))
            ThreePointArc((152.4, 6.35), (149.225, 5.499261314), (146.900738686, 3.175))
            Line((146.900738686, 3.175), (152.4, 3.175))
            ThreePointArc((152.4, 3.175), (154.6450640303, 2.2450640303), (155.575, 0))
            ThreePointArc((155.575, 0), (154.6450640303, -2.2450640303), (152.4, -3.175))
            Line((152.4, -3.175), (146.900738686, -3.175))
            ThreePointArc((146.900738686, -3.175), (149.225, -5.499261314), (152.4, -6.35))
            ThreePointArc((152.4, -6.35), (156.8901280605, -4.4901280605), (158.75, 0))
        make_face()
        with BuildLine():
            ThreePointArc((132.499261314, -3.175), (130.175, -5.499261314), (127, -6.35))
            Line((127, -6.35), (152.4, -6.35))
            ThreePointArc((152.4, -6.35), (149.225, -5.499261314), (146.900738686, -3.175))
            Line((146.900738686, -3.175), (132.499261314, -3.175))
        make_face()
        with BuildLine():
            ThreePointArc((121.500738686, -3.175), (123.825, -5.499261314), (127, -6.35))
            ThreePointArc((127, -6.35), (130.175, -5.499261314), (132.499261314, -3.175))
            Line((132.499261314, -3.175), (127, -3.175))
            Line((127, -3.175), (121.500738686, -3.175))
        make_face()
        with BuildLine():
            ThreePointArc((81.699261314, -3.175), (79.375, -5.499261314), (76.2, -6.35))
            Line((76.2, -6.35), (127, -6.35))
            ThreePointArc((127, -6.35), (123.825, -5.499261314), (121.500738686, -3.175))
            Line((121.500738686, -3.175), (81.699261314, -3.175))
        make_face()
    extrude(amount=F4_DEPTH)


with BuildPart() as f5:
    # F0 (on Top) → F5 (new body)
    with BuildSketch(Plane.XY):
        Circle(F0_R)
    extrude(amount=F5_DEPTH)


solid = Compound([f1.part, f2.part, f3.part, f4.part, f5.part])
